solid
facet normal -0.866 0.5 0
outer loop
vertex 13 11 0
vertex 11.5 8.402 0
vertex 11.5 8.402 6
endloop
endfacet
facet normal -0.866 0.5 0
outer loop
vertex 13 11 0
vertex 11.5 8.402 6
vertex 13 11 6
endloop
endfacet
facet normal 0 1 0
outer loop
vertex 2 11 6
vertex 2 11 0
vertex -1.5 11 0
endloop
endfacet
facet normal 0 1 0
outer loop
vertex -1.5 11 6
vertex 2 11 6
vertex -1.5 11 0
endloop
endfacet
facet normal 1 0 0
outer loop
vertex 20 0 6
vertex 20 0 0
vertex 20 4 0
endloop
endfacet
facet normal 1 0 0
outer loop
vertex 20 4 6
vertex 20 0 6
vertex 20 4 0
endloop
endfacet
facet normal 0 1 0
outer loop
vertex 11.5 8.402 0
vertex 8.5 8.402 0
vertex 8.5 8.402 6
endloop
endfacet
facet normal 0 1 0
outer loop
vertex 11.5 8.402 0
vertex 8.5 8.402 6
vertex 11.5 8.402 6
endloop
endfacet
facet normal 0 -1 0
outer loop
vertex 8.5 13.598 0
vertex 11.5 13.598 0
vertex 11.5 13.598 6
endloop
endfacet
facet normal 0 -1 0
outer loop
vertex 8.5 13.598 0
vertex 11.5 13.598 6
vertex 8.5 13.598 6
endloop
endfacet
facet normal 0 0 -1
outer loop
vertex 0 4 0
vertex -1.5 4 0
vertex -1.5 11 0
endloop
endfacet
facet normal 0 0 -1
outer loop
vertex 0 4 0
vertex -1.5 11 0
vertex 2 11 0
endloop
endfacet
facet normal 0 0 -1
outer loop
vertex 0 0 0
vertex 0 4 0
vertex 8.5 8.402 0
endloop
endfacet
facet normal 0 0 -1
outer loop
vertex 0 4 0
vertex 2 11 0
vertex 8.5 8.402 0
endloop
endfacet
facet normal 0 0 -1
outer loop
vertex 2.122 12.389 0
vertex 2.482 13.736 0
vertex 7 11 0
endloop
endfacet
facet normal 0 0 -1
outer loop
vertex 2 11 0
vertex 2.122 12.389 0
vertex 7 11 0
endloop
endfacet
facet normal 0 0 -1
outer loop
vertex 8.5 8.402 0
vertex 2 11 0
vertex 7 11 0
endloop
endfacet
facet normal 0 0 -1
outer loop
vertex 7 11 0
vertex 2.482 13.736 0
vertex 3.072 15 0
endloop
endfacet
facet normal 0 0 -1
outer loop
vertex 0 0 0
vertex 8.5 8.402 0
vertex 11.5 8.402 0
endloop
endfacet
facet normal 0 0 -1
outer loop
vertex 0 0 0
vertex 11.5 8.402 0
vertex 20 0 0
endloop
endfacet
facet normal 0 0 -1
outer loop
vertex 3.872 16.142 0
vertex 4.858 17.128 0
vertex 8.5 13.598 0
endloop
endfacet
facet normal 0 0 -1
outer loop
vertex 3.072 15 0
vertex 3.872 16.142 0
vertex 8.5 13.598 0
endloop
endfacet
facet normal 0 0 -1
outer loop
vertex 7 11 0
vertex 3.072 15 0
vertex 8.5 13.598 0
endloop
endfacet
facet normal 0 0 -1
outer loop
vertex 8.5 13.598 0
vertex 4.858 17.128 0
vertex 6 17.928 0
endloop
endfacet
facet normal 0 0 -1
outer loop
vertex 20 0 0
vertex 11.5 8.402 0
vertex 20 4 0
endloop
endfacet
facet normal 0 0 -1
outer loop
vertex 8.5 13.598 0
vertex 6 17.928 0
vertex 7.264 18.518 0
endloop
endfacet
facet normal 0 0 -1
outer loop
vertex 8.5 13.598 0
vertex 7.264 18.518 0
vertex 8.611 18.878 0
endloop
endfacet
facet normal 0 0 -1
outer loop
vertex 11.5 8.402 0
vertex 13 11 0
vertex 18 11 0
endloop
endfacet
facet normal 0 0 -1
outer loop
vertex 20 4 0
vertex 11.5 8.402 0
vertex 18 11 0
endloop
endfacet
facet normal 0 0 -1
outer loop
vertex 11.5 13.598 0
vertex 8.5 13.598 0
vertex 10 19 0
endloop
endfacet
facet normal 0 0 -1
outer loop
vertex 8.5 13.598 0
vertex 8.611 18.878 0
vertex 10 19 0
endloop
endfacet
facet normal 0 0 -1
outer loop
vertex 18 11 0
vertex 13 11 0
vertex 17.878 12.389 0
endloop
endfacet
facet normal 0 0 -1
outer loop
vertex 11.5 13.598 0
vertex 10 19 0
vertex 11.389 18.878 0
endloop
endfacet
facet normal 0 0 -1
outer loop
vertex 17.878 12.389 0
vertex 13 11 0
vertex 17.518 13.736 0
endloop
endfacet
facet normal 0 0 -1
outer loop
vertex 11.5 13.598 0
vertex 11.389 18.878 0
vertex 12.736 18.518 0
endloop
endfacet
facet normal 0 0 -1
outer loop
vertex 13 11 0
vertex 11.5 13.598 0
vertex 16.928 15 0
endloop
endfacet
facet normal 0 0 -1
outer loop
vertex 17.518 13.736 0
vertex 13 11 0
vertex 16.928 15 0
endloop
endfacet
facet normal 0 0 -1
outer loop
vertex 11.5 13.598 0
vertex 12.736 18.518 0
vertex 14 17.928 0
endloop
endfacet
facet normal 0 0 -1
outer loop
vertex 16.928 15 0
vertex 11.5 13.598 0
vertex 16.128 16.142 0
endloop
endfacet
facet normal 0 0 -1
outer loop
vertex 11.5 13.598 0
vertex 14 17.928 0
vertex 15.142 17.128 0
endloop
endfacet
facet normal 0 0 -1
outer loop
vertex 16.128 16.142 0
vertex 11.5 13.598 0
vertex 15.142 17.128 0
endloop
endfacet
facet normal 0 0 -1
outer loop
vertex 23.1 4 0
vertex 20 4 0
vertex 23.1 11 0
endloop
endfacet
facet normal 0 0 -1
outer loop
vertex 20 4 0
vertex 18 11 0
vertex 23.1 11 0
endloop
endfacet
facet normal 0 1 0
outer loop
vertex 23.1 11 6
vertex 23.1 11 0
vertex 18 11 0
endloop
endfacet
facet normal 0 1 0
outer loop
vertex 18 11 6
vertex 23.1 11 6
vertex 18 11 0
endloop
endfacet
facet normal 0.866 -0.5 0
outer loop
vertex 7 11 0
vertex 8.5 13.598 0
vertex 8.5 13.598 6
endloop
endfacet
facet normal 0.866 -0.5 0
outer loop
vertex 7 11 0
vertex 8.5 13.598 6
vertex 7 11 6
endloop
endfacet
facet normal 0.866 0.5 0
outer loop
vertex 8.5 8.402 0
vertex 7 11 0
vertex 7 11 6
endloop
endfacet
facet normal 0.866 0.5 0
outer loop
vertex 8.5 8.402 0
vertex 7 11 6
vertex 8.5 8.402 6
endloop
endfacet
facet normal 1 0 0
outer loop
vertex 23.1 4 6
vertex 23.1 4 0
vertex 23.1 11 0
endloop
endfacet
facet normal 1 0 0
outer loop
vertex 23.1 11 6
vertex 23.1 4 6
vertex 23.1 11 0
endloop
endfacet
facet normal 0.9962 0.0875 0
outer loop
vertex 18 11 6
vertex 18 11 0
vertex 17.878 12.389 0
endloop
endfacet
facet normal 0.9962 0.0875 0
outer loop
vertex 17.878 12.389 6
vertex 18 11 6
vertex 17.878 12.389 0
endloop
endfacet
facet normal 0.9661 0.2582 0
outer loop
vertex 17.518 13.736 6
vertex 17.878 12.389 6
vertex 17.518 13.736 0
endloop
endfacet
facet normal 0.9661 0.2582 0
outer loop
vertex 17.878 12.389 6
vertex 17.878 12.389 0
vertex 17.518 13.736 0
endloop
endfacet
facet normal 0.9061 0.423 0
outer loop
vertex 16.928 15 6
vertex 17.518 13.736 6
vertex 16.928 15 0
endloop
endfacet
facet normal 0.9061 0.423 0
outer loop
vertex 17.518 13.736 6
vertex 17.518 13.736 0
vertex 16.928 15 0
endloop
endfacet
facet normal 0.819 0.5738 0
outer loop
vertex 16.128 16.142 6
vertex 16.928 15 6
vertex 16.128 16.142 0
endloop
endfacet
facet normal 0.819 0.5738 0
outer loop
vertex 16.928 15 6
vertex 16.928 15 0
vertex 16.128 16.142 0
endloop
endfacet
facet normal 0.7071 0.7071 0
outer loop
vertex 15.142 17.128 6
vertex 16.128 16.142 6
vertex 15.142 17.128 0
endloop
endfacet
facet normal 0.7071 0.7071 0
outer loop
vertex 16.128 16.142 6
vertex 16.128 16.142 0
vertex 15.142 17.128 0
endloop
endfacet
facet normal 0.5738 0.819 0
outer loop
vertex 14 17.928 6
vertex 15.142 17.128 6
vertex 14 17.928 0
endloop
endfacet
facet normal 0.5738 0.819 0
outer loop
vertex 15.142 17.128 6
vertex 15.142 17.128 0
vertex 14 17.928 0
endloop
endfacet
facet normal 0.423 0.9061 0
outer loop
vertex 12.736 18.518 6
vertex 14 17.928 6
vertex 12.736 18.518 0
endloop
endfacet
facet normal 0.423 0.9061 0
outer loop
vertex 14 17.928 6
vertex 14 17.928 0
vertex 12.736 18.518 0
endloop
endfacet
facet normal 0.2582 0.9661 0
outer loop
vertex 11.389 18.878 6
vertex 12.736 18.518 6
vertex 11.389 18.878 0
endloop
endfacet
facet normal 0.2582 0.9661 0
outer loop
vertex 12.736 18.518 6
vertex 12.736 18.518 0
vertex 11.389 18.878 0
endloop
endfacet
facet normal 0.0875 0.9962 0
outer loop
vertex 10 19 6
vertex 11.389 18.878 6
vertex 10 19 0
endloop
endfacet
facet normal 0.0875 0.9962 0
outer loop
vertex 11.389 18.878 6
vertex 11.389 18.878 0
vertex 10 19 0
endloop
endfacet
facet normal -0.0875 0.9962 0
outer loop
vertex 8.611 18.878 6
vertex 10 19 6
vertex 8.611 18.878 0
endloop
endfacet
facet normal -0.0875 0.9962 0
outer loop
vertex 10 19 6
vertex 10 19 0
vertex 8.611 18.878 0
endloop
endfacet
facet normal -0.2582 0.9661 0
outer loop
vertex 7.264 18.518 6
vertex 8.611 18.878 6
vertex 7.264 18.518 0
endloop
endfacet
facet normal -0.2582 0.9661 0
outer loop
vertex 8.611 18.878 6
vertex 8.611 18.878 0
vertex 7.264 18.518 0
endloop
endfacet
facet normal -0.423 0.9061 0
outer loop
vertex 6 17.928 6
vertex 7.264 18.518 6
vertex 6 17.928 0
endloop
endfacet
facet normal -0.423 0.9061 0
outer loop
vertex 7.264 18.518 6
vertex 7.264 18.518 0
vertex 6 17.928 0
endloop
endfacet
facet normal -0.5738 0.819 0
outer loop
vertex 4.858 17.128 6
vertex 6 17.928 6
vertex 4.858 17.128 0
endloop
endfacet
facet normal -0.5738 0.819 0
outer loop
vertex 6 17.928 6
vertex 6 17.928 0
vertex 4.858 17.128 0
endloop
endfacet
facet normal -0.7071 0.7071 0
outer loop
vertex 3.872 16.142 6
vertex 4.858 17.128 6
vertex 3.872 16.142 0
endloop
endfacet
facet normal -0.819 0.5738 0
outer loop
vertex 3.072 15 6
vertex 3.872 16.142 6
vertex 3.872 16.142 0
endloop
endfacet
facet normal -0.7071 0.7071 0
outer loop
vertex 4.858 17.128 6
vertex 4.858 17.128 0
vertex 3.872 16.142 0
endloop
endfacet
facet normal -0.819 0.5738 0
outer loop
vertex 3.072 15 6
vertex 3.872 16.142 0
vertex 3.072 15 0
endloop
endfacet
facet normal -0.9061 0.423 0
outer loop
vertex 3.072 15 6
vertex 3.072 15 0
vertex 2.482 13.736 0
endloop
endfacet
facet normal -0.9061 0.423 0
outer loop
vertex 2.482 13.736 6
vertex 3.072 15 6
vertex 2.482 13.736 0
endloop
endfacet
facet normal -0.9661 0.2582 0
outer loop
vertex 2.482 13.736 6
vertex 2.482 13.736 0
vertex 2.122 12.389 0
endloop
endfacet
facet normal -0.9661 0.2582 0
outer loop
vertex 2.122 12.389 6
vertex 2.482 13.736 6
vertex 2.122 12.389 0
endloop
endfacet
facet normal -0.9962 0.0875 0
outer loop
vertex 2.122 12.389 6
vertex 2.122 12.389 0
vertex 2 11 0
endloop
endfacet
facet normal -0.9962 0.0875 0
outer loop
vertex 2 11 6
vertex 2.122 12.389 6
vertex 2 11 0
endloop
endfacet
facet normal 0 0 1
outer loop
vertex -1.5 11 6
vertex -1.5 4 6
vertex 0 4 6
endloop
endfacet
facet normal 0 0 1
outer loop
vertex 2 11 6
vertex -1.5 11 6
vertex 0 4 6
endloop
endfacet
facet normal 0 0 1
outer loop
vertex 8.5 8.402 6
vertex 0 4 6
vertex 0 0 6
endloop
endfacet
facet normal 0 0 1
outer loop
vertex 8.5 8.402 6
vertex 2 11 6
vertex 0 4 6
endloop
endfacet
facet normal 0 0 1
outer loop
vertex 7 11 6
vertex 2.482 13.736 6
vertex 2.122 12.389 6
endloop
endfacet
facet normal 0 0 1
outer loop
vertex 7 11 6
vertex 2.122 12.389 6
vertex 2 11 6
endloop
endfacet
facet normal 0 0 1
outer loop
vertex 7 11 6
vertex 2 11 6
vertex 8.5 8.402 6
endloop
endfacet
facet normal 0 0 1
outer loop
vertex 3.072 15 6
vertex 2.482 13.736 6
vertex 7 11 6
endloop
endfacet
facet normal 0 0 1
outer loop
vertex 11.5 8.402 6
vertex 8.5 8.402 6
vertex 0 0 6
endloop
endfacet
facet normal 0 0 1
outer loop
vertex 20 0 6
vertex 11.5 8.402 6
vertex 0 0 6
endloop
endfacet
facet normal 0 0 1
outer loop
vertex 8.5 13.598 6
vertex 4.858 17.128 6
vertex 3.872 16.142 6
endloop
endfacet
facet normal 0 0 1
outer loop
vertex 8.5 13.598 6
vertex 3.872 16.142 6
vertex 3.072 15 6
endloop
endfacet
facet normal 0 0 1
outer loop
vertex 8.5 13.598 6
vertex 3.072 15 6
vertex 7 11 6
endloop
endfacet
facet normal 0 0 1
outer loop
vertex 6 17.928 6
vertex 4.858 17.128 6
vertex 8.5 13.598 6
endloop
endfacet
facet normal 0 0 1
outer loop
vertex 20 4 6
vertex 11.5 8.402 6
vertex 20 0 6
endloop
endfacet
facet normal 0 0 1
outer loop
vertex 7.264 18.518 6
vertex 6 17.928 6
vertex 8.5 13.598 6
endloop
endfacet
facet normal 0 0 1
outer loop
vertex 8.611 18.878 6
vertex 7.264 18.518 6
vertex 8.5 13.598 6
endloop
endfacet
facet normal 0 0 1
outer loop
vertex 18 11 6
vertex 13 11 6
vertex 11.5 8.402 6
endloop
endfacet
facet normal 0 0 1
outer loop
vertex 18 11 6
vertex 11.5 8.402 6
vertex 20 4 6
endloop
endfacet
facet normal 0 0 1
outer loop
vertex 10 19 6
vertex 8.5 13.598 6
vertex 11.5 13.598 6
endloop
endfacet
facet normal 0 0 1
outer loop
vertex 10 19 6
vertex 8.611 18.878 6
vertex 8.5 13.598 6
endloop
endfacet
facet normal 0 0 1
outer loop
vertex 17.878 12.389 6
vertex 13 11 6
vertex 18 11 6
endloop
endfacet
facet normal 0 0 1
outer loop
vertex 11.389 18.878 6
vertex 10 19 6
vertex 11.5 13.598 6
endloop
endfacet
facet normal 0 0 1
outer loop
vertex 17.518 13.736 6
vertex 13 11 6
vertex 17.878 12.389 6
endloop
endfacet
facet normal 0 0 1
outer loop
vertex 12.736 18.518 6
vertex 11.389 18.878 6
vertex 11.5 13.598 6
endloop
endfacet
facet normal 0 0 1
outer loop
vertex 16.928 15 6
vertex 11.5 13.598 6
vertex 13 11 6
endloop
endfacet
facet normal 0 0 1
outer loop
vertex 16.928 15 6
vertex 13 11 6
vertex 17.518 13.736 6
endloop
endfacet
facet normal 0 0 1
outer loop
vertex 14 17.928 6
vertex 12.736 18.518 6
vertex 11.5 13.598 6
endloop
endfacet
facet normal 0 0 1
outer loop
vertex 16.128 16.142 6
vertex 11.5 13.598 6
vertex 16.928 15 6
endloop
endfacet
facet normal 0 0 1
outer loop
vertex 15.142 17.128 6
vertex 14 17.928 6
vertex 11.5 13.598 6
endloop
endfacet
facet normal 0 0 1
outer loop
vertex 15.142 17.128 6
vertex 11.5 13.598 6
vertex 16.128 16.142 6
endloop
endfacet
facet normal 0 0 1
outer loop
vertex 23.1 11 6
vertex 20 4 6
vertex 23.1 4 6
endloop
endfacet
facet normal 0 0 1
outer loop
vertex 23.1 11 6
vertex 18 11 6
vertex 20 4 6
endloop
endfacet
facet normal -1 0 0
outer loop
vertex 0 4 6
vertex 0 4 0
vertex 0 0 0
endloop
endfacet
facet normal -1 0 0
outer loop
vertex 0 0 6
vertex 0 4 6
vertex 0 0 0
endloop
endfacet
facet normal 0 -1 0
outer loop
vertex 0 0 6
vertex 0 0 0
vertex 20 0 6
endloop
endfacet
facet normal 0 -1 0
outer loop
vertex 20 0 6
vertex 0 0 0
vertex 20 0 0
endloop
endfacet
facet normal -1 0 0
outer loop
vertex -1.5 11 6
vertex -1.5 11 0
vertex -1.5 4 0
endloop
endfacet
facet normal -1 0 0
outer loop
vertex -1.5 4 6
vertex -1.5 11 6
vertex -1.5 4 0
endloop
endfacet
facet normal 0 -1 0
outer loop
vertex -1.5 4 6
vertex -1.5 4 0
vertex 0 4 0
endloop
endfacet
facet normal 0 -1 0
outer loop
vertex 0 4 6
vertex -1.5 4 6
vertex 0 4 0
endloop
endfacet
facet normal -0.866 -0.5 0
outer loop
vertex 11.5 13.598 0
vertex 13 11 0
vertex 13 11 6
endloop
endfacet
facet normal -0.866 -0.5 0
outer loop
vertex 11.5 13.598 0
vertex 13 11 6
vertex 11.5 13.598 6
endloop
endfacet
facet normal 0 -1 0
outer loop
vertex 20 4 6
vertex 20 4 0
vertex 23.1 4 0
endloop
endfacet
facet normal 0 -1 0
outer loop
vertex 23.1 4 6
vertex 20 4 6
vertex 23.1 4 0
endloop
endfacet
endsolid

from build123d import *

# Parameters (mm, degrees)
BOSS_EXTRUDE1_DEPTH = 6


with BuildPart() as part:
    # Sketch1 → Boss-Extrude1 (new body)
    with BuildSketch(Plane.XY):
        with BuildLine():
            Line((0, 0), (20, 0))
            Line((20, 0), (20, 4))
            Line((20, 4), (23.1, 4))
            Line((23.1, 4), (23.1, 11))
            Line((23.1, 11), (18, 11))
            ThreePointArc((18, 11), (10, 19), (2, 11))
            Line((2, 11), (-1.5, 11))
            Line((-1.5, 11), (-1.5, 4))
            Line((-1.5, 4), (0, 4))
            Line((0, 4), (0, 0))
        make_face()
        Polygon((13, 11), (11.5, 13.598076211), (8.5, 13.598076211), (7, 11), (8.5, 8.401923789), (11.5, 8.401923789), align=None, mode=Mode.SUBTRACT)
    extrude(amount=BOSS_EXTRUDE1_DEPTH)


solid = part.part
